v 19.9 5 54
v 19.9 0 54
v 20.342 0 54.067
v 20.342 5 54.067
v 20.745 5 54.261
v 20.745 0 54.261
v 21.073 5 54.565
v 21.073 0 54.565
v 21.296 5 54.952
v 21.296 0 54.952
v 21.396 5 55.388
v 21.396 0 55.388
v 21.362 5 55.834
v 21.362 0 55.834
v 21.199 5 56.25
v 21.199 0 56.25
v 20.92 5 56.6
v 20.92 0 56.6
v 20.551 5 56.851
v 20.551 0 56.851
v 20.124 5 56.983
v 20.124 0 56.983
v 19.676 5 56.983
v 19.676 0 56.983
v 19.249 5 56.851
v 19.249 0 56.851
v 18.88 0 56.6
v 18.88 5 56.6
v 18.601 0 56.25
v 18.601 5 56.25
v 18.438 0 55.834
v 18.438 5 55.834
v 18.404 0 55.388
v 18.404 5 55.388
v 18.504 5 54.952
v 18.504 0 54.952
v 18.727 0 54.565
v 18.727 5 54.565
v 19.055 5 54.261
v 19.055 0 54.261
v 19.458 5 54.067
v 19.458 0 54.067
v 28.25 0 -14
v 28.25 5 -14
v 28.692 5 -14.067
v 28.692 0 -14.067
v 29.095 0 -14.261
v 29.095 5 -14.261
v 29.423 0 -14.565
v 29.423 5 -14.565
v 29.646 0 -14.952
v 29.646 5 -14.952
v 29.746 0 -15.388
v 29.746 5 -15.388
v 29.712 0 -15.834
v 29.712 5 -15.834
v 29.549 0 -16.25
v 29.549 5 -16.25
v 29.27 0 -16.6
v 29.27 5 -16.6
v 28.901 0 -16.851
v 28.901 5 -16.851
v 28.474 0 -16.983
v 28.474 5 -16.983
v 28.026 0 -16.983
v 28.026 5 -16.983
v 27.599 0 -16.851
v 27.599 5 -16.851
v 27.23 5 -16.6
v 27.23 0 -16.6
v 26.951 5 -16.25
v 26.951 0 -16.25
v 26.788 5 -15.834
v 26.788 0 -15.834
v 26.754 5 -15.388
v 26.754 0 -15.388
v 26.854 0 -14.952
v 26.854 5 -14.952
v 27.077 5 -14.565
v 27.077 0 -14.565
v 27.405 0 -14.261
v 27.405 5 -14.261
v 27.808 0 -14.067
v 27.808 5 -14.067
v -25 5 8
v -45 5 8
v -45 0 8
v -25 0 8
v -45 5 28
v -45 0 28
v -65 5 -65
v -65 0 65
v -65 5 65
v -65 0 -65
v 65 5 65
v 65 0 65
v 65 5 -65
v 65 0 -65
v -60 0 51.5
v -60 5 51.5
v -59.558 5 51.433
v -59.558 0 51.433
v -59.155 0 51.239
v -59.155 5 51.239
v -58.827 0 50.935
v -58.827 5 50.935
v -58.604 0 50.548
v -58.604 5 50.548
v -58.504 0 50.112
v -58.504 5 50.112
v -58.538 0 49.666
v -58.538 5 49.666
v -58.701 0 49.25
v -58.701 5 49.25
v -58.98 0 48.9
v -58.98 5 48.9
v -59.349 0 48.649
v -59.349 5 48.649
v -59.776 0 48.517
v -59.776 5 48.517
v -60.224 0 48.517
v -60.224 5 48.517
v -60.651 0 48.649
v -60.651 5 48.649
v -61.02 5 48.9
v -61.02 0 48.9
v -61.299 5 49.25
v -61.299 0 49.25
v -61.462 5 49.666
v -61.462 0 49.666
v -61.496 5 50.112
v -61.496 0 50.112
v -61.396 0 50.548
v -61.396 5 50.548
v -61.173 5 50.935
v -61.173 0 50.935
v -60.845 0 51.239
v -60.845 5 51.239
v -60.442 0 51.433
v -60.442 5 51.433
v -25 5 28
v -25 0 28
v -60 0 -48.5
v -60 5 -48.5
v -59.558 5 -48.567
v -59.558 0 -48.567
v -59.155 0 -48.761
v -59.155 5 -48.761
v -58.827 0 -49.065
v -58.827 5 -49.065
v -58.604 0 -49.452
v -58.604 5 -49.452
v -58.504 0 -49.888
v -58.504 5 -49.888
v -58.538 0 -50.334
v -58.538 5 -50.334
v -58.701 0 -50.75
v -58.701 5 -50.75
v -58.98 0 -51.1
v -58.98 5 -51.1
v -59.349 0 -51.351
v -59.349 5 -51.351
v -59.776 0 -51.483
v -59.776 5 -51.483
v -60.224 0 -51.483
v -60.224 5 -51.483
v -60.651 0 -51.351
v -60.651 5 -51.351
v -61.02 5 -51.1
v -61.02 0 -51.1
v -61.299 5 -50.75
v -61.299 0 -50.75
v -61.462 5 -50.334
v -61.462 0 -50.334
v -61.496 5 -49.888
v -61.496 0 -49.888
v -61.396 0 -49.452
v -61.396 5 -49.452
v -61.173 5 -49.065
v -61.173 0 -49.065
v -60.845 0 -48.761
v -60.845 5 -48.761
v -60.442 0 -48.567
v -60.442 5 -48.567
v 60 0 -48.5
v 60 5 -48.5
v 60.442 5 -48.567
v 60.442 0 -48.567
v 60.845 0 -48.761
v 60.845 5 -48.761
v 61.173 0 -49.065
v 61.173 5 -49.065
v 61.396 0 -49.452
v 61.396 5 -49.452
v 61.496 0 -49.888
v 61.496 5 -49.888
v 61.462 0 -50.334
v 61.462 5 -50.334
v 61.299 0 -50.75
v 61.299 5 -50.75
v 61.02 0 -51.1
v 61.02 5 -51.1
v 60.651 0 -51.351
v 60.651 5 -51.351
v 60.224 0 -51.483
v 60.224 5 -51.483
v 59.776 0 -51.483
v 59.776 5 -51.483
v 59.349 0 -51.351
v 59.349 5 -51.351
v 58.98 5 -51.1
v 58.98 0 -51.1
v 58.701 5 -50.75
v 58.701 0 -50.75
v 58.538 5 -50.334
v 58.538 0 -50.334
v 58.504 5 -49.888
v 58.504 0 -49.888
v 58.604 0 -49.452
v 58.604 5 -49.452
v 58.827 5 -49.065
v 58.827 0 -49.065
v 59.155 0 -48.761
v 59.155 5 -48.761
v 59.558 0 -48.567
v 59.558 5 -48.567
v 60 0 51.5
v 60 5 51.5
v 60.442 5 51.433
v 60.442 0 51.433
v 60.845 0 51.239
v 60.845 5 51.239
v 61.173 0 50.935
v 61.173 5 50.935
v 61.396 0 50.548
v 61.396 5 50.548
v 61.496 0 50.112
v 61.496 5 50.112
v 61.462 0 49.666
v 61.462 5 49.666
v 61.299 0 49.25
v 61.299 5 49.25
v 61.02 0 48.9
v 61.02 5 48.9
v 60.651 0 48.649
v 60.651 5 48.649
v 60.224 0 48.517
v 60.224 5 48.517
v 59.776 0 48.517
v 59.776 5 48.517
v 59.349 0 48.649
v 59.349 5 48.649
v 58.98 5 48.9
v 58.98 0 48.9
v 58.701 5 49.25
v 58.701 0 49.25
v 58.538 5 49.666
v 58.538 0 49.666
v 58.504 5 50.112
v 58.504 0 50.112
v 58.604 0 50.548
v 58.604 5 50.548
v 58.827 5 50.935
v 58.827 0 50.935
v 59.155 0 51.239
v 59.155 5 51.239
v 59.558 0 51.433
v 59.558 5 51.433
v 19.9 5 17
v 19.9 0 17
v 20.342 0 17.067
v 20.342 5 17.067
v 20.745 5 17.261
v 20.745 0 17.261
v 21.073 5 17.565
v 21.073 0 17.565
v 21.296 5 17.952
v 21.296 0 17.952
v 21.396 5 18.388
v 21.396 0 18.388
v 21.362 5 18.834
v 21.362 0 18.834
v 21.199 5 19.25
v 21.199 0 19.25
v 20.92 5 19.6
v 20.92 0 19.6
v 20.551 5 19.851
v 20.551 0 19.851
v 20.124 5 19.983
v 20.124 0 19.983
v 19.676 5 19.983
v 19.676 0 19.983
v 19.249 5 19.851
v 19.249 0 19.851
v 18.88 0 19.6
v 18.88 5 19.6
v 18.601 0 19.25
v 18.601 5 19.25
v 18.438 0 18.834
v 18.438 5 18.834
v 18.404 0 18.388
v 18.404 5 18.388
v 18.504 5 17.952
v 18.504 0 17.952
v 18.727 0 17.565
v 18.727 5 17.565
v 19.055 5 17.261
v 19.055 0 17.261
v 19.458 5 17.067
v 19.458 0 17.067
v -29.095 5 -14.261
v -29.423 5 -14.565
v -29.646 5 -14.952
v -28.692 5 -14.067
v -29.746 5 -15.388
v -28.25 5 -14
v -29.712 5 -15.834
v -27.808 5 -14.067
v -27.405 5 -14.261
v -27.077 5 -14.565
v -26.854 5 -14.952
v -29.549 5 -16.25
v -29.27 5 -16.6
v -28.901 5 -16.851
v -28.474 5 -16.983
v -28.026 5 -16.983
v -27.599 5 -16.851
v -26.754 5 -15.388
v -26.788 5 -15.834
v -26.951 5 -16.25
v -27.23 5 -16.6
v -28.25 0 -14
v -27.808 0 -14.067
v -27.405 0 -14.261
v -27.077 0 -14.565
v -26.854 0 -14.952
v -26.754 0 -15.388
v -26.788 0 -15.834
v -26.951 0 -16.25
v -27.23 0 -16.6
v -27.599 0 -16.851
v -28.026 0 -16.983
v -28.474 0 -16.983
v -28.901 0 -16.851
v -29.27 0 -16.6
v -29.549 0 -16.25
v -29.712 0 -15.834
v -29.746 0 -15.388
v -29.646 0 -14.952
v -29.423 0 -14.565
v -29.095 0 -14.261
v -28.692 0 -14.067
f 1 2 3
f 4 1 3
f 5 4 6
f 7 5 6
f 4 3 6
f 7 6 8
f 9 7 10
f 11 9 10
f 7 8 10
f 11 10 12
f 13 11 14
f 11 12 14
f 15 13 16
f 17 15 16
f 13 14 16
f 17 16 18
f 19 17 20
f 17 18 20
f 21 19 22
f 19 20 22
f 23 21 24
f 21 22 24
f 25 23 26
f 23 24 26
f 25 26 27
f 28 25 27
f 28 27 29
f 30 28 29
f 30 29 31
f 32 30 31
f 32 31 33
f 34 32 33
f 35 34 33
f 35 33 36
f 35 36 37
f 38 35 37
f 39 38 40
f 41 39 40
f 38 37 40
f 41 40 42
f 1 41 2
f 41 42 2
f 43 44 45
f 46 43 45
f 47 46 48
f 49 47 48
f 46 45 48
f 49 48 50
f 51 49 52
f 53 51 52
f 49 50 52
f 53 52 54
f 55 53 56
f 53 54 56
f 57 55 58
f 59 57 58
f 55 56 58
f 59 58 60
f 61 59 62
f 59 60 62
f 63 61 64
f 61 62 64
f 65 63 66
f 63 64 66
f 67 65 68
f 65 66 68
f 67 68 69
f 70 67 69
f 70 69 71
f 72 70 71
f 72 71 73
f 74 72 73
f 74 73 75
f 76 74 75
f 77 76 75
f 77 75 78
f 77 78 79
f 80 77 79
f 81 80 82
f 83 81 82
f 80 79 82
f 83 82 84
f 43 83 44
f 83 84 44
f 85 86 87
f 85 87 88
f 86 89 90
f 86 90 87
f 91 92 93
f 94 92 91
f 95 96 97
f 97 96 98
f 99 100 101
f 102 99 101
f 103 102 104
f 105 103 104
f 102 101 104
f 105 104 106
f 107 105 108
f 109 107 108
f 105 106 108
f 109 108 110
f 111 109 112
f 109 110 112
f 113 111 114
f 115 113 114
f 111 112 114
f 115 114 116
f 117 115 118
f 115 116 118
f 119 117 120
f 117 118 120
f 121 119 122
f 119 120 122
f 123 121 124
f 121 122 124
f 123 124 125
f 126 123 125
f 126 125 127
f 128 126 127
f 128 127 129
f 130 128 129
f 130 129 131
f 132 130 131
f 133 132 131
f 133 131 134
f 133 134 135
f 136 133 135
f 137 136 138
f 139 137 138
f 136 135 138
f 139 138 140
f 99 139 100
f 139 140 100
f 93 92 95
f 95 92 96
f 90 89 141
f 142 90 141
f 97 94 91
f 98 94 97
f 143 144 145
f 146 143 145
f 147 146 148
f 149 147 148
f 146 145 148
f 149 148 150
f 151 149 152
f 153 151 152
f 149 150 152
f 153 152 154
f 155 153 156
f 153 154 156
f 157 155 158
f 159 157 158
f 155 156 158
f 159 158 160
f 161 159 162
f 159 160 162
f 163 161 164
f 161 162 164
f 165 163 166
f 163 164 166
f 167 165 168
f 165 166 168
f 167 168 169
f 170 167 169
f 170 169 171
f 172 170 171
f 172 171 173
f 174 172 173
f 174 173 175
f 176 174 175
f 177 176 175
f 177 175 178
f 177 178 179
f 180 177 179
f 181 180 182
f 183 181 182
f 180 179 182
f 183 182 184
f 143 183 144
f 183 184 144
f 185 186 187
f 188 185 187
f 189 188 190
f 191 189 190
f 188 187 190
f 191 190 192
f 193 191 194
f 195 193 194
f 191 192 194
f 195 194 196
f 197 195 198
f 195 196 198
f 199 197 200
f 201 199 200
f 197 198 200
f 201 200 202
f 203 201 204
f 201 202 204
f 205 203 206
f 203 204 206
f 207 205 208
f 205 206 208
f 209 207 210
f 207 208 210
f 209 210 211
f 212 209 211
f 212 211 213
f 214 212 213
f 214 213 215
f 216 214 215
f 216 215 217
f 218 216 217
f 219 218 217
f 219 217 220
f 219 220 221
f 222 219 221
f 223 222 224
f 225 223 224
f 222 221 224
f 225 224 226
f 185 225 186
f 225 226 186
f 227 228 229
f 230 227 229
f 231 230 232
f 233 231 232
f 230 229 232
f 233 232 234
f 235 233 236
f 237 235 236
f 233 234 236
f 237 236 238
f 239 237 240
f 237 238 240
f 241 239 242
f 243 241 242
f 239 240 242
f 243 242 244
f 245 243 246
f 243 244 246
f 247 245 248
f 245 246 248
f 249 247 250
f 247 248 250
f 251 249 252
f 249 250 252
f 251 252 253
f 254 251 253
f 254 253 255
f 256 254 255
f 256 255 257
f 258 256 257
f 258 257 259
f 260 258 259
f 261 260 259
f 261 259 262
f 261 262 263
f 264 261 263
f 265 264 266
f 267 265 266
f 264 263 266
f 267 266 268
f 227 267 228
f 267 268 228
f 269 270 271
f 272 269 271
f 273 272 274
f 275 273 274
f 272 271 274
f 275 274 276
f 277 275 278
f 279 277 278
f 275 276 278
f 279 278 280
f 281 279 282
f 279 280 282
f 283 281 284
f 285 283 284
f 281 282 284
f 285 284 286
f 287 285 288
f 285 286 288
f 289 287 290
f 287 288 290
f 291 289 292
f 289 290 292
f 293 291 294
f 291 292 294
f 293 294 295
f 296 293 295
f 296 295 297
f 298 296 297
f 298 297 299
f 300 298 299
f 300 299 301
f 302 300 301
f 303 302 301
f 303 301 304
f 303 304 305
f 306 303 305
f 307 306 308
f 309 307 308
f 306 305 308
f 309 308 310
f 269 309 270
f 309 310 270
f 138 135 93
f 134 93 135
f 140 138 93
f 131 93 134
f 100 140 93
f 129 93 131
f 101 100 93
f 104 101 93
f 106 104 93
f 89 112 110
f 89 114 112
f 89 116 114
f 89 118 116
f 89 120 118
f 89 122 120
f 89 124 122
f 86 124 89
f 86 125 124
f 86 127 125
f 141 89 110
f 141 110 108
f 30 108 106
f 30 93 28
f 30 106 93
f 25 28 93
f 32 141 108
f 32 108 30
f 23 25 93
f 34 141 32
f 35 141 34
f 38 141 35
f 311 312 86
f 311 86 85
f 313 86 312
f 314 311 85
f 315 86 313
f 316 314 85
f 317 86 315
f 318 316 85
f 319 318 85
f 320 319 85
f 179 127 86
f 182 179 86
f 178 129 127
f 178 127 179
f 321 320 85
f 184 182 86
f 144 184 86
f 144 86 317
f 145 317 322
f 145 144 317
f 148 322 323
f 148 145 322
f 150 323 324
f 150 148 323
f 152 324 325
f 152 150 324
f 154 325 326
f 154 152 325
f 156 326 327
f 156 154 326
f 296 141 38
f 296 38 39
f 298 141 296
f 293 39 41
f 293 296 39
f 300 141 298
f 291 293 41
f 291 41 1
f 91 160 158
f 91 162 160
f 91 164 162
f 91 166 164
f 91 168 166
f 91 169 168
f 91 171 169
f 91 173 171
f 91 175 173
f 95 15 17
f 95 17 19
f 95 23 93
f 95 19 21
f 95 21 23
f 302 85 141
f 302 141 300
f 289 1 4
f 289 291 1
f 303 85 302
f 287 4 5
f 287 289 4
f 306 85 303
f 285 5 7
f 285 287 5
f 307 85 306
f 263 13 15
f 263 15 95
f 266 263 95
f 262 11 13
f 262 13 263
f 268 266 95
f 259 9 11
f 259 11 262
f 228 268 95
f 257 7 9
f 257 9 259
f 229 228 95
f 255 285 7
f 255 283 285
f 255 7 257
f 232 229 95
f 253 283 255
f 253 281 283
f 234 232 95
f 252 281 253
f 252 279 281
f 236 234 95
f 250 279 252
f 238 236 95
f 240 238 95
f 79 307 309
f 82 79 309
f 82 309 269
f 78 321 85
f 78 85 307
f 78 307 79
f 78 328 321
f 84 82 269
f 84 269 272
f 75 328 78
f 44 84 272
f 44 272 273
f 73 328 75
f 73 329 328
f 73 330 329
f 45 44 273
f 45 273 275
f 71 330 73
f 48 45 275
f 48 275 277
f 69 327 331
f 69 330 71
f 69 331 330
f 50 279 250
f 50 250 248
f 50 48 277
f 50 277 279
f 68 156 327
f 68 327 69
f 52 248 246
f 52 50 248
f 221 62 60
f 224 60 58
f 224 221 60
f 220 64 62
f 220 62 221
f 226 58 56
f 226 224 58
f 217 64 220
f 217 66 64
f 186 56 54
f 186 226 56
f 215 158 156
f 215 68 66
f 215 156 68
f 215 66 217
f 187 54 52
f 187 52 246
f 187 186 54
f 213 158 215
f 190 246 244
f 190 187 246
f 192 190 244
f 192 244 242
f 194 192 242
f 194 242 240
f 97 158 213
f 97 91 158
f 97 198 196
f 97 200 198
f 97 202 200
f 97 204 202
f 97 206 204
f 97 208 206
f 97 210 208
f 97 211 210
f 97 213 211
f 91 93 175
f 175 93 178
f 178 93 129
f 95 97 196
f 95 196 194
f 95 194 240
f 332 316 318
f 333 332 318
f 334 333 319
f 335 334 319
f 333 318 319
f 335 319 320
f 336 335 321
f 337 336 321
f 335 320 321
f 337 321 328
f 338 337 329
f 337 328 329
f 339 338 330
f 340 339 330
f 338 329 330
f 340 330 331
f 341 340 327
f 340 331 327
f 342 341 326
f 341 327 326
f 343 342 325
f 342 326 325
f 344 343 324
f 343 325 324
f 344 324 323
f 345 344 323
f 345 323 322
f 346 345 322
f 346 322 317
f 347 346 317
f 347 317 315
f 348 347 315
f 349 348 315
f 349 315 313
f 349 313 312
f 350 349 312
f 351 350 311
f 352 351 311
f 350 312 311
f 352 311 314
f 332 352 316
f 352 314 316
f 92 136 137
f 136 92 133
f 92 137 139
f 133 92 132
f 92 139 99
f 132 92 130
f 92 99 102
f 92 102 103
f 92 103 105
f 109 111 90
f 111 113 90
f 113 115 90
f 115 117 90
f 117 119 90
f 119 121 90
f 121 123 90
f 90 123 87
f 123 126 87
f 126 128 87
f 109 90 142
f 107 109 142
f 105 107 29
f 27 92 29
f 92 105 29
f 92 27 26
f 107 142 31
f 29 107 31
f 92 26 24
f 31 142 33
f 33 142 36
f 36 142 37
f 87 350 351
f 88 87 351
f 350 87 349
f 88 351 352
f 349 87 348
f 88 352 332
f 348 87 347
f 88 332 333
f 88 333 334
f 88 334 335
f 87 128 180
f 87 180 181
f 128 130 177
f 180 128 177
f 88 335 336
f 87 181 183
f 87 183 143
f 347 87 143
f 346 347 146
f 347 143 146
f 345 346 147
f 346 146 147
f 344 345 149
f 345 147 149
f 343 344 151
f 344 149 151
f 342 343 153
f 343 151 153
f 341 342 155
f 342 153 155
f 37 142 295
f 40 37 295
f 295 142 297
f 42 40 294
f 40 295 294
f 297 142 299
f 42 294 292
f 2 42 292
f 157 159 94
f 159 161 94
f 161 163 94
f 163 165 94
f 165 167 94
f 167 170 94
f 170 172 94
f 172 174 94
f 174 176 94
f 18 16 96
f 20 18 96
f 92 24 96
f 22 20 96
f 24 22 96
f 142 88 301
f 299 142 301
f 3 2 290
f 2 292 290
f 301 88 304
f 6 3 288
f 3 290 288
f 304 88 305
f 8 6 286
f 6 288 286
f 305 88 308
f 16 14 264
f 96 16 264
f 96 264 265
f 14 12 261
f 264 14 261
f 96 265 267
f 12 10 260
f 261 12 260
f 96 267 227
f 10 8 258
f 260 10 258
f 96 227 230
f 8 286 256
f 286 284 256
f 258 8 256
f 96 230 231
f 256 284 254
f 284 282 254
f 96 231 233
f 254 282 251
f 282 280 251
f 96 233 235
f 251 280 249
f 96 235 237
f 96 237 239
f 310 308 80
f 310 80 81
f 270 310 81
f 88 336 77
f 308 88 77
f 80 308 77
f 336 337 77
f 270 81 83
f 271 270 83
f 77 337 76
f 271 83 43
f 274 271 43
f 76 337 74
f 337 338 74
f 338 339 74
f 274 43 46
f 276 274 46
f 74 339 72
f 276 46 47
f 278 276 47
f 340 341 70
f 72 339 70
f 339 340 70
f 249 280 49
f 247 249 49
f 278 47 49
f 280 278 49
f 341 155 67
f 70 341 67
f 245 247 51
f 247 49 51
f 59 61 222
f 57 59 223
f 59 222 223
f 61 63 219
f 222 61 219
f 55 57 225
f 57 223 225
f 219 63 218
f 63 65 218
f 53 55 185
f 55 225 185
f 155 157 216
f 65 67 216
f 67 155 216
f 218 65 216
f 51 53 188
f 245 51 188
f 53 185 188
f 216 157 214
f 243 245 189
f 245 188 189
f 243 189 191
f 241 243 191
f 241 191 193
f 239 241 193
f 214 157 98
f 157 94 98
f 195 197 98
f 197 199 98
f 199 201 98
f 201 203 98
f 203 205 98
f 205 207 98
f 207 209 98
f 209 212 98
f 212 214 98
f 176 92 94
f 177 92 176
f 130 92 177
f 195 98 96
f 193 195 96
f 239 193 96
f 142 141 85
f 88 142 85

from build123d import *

# Parameters (mm, degrees)
SKETCH1_W           = 130
SKETCH1_H           = 130
BOSS_EXTRUDE1_DEPTH = 5
SKETCH2_R           = 1.5
CUT_EXTRUDE1_DEPTH  = 5
SKETCH3_R           = 1.5
CUT_EXTRUDE2_DEPTH  = 5
SKETCH4_R           = 1.5
CUT_EXTRUDE3_DEPTH  = 5
SKETCH5_W           = 20
SKETCH5_H           = 20
CUT_EXTRUDE4_DEPTH  = 5


with BuildPart() as part:
    # Sketch1 → Boss-Extrude1 (new body)
    with BuildSketch(Plane(origin=(0, 0, 0), x_dir=(1, 0, 0), z_dir=(0, 1, 0))):
        Rectangle(SKETCH1_W, SKETCH1_H)
    extrude(amount=BOSS_EXTRUDE1_DEPTH)

    # Sketch2 → Cut-Extrude1 (cut)
    with BuildSketch(Plane.XZ):
        with Locations(Location((19.9, 55.5, 0), (0, 0, 270))):
            Circle(SKETCH2_R)
        with Locations(Location((19.9, 18.5, 0), (0, 0, 270))):
            Circle(SKETCH2_R)
    extrude(amount=-CUT_EXTRUDE1_DEPTH, mode=Mode.SUBTRACT)

    # Sketch3 → Cut-Extrude2 (cut)
    with BuildSketch(Plane(origin=(0, 5, 0), x_dir=(1, 0, 0), z_dir=(0, 1, 0))):
        with Locations(Location((-28.25, 15.5, 0), (0, 0, 270))):
            Circle(SKETCH3_R)
        with Locations(Location((28.25, 15.5, 0), (0, 0, 270))):
            Circle(SKETCH3_R)
    extrude(amount=-CUT_EXTRUDE2_DEPTH, mode=Mode.SUBTRACT)

    # Sketch4 → Cut-Extrude3 (cut)
    with BuildSketch(Plane(origin=(0, 5, 0), x_dir=(1, 0, 0), z_dir=(0, 1, 0))):
        with Locations(Location((-60, 50, 0), (0, 0, 270))):
            Circle(SKETCH4_R)
        with Locations(Location((60, 50, 0), (0, 0, 270))):
            Circle(SKETCH4_R)
        with Locations(Location((60, -50, 0), (0, 0, 270))):
            Circle(SKETCH4_R)
        with Locations(Location((-60, -50, 0), (0, 0, 270))):
            Circle(SKETCH4_R)
    extrude(amount=-CUT_EXTRUDE3_DEPTH, mode=Mode.SUBTRACT)

    # Sketch5 → Cut-Extrude4 (cut)
    with BuildSketch(Plane(origin=(0, 5, 0), x_dir=(1, 0, 0), z_dir=(0, 1, 0))):
        with Locations((-35, -18)):
            Rectangle(SKETCH5_W, SKETCH5_H)
    extrude(amount=-CUT_EXTRUDE4_DEPTH, mode=Mode.SUBTRACT)


solid = part.part
